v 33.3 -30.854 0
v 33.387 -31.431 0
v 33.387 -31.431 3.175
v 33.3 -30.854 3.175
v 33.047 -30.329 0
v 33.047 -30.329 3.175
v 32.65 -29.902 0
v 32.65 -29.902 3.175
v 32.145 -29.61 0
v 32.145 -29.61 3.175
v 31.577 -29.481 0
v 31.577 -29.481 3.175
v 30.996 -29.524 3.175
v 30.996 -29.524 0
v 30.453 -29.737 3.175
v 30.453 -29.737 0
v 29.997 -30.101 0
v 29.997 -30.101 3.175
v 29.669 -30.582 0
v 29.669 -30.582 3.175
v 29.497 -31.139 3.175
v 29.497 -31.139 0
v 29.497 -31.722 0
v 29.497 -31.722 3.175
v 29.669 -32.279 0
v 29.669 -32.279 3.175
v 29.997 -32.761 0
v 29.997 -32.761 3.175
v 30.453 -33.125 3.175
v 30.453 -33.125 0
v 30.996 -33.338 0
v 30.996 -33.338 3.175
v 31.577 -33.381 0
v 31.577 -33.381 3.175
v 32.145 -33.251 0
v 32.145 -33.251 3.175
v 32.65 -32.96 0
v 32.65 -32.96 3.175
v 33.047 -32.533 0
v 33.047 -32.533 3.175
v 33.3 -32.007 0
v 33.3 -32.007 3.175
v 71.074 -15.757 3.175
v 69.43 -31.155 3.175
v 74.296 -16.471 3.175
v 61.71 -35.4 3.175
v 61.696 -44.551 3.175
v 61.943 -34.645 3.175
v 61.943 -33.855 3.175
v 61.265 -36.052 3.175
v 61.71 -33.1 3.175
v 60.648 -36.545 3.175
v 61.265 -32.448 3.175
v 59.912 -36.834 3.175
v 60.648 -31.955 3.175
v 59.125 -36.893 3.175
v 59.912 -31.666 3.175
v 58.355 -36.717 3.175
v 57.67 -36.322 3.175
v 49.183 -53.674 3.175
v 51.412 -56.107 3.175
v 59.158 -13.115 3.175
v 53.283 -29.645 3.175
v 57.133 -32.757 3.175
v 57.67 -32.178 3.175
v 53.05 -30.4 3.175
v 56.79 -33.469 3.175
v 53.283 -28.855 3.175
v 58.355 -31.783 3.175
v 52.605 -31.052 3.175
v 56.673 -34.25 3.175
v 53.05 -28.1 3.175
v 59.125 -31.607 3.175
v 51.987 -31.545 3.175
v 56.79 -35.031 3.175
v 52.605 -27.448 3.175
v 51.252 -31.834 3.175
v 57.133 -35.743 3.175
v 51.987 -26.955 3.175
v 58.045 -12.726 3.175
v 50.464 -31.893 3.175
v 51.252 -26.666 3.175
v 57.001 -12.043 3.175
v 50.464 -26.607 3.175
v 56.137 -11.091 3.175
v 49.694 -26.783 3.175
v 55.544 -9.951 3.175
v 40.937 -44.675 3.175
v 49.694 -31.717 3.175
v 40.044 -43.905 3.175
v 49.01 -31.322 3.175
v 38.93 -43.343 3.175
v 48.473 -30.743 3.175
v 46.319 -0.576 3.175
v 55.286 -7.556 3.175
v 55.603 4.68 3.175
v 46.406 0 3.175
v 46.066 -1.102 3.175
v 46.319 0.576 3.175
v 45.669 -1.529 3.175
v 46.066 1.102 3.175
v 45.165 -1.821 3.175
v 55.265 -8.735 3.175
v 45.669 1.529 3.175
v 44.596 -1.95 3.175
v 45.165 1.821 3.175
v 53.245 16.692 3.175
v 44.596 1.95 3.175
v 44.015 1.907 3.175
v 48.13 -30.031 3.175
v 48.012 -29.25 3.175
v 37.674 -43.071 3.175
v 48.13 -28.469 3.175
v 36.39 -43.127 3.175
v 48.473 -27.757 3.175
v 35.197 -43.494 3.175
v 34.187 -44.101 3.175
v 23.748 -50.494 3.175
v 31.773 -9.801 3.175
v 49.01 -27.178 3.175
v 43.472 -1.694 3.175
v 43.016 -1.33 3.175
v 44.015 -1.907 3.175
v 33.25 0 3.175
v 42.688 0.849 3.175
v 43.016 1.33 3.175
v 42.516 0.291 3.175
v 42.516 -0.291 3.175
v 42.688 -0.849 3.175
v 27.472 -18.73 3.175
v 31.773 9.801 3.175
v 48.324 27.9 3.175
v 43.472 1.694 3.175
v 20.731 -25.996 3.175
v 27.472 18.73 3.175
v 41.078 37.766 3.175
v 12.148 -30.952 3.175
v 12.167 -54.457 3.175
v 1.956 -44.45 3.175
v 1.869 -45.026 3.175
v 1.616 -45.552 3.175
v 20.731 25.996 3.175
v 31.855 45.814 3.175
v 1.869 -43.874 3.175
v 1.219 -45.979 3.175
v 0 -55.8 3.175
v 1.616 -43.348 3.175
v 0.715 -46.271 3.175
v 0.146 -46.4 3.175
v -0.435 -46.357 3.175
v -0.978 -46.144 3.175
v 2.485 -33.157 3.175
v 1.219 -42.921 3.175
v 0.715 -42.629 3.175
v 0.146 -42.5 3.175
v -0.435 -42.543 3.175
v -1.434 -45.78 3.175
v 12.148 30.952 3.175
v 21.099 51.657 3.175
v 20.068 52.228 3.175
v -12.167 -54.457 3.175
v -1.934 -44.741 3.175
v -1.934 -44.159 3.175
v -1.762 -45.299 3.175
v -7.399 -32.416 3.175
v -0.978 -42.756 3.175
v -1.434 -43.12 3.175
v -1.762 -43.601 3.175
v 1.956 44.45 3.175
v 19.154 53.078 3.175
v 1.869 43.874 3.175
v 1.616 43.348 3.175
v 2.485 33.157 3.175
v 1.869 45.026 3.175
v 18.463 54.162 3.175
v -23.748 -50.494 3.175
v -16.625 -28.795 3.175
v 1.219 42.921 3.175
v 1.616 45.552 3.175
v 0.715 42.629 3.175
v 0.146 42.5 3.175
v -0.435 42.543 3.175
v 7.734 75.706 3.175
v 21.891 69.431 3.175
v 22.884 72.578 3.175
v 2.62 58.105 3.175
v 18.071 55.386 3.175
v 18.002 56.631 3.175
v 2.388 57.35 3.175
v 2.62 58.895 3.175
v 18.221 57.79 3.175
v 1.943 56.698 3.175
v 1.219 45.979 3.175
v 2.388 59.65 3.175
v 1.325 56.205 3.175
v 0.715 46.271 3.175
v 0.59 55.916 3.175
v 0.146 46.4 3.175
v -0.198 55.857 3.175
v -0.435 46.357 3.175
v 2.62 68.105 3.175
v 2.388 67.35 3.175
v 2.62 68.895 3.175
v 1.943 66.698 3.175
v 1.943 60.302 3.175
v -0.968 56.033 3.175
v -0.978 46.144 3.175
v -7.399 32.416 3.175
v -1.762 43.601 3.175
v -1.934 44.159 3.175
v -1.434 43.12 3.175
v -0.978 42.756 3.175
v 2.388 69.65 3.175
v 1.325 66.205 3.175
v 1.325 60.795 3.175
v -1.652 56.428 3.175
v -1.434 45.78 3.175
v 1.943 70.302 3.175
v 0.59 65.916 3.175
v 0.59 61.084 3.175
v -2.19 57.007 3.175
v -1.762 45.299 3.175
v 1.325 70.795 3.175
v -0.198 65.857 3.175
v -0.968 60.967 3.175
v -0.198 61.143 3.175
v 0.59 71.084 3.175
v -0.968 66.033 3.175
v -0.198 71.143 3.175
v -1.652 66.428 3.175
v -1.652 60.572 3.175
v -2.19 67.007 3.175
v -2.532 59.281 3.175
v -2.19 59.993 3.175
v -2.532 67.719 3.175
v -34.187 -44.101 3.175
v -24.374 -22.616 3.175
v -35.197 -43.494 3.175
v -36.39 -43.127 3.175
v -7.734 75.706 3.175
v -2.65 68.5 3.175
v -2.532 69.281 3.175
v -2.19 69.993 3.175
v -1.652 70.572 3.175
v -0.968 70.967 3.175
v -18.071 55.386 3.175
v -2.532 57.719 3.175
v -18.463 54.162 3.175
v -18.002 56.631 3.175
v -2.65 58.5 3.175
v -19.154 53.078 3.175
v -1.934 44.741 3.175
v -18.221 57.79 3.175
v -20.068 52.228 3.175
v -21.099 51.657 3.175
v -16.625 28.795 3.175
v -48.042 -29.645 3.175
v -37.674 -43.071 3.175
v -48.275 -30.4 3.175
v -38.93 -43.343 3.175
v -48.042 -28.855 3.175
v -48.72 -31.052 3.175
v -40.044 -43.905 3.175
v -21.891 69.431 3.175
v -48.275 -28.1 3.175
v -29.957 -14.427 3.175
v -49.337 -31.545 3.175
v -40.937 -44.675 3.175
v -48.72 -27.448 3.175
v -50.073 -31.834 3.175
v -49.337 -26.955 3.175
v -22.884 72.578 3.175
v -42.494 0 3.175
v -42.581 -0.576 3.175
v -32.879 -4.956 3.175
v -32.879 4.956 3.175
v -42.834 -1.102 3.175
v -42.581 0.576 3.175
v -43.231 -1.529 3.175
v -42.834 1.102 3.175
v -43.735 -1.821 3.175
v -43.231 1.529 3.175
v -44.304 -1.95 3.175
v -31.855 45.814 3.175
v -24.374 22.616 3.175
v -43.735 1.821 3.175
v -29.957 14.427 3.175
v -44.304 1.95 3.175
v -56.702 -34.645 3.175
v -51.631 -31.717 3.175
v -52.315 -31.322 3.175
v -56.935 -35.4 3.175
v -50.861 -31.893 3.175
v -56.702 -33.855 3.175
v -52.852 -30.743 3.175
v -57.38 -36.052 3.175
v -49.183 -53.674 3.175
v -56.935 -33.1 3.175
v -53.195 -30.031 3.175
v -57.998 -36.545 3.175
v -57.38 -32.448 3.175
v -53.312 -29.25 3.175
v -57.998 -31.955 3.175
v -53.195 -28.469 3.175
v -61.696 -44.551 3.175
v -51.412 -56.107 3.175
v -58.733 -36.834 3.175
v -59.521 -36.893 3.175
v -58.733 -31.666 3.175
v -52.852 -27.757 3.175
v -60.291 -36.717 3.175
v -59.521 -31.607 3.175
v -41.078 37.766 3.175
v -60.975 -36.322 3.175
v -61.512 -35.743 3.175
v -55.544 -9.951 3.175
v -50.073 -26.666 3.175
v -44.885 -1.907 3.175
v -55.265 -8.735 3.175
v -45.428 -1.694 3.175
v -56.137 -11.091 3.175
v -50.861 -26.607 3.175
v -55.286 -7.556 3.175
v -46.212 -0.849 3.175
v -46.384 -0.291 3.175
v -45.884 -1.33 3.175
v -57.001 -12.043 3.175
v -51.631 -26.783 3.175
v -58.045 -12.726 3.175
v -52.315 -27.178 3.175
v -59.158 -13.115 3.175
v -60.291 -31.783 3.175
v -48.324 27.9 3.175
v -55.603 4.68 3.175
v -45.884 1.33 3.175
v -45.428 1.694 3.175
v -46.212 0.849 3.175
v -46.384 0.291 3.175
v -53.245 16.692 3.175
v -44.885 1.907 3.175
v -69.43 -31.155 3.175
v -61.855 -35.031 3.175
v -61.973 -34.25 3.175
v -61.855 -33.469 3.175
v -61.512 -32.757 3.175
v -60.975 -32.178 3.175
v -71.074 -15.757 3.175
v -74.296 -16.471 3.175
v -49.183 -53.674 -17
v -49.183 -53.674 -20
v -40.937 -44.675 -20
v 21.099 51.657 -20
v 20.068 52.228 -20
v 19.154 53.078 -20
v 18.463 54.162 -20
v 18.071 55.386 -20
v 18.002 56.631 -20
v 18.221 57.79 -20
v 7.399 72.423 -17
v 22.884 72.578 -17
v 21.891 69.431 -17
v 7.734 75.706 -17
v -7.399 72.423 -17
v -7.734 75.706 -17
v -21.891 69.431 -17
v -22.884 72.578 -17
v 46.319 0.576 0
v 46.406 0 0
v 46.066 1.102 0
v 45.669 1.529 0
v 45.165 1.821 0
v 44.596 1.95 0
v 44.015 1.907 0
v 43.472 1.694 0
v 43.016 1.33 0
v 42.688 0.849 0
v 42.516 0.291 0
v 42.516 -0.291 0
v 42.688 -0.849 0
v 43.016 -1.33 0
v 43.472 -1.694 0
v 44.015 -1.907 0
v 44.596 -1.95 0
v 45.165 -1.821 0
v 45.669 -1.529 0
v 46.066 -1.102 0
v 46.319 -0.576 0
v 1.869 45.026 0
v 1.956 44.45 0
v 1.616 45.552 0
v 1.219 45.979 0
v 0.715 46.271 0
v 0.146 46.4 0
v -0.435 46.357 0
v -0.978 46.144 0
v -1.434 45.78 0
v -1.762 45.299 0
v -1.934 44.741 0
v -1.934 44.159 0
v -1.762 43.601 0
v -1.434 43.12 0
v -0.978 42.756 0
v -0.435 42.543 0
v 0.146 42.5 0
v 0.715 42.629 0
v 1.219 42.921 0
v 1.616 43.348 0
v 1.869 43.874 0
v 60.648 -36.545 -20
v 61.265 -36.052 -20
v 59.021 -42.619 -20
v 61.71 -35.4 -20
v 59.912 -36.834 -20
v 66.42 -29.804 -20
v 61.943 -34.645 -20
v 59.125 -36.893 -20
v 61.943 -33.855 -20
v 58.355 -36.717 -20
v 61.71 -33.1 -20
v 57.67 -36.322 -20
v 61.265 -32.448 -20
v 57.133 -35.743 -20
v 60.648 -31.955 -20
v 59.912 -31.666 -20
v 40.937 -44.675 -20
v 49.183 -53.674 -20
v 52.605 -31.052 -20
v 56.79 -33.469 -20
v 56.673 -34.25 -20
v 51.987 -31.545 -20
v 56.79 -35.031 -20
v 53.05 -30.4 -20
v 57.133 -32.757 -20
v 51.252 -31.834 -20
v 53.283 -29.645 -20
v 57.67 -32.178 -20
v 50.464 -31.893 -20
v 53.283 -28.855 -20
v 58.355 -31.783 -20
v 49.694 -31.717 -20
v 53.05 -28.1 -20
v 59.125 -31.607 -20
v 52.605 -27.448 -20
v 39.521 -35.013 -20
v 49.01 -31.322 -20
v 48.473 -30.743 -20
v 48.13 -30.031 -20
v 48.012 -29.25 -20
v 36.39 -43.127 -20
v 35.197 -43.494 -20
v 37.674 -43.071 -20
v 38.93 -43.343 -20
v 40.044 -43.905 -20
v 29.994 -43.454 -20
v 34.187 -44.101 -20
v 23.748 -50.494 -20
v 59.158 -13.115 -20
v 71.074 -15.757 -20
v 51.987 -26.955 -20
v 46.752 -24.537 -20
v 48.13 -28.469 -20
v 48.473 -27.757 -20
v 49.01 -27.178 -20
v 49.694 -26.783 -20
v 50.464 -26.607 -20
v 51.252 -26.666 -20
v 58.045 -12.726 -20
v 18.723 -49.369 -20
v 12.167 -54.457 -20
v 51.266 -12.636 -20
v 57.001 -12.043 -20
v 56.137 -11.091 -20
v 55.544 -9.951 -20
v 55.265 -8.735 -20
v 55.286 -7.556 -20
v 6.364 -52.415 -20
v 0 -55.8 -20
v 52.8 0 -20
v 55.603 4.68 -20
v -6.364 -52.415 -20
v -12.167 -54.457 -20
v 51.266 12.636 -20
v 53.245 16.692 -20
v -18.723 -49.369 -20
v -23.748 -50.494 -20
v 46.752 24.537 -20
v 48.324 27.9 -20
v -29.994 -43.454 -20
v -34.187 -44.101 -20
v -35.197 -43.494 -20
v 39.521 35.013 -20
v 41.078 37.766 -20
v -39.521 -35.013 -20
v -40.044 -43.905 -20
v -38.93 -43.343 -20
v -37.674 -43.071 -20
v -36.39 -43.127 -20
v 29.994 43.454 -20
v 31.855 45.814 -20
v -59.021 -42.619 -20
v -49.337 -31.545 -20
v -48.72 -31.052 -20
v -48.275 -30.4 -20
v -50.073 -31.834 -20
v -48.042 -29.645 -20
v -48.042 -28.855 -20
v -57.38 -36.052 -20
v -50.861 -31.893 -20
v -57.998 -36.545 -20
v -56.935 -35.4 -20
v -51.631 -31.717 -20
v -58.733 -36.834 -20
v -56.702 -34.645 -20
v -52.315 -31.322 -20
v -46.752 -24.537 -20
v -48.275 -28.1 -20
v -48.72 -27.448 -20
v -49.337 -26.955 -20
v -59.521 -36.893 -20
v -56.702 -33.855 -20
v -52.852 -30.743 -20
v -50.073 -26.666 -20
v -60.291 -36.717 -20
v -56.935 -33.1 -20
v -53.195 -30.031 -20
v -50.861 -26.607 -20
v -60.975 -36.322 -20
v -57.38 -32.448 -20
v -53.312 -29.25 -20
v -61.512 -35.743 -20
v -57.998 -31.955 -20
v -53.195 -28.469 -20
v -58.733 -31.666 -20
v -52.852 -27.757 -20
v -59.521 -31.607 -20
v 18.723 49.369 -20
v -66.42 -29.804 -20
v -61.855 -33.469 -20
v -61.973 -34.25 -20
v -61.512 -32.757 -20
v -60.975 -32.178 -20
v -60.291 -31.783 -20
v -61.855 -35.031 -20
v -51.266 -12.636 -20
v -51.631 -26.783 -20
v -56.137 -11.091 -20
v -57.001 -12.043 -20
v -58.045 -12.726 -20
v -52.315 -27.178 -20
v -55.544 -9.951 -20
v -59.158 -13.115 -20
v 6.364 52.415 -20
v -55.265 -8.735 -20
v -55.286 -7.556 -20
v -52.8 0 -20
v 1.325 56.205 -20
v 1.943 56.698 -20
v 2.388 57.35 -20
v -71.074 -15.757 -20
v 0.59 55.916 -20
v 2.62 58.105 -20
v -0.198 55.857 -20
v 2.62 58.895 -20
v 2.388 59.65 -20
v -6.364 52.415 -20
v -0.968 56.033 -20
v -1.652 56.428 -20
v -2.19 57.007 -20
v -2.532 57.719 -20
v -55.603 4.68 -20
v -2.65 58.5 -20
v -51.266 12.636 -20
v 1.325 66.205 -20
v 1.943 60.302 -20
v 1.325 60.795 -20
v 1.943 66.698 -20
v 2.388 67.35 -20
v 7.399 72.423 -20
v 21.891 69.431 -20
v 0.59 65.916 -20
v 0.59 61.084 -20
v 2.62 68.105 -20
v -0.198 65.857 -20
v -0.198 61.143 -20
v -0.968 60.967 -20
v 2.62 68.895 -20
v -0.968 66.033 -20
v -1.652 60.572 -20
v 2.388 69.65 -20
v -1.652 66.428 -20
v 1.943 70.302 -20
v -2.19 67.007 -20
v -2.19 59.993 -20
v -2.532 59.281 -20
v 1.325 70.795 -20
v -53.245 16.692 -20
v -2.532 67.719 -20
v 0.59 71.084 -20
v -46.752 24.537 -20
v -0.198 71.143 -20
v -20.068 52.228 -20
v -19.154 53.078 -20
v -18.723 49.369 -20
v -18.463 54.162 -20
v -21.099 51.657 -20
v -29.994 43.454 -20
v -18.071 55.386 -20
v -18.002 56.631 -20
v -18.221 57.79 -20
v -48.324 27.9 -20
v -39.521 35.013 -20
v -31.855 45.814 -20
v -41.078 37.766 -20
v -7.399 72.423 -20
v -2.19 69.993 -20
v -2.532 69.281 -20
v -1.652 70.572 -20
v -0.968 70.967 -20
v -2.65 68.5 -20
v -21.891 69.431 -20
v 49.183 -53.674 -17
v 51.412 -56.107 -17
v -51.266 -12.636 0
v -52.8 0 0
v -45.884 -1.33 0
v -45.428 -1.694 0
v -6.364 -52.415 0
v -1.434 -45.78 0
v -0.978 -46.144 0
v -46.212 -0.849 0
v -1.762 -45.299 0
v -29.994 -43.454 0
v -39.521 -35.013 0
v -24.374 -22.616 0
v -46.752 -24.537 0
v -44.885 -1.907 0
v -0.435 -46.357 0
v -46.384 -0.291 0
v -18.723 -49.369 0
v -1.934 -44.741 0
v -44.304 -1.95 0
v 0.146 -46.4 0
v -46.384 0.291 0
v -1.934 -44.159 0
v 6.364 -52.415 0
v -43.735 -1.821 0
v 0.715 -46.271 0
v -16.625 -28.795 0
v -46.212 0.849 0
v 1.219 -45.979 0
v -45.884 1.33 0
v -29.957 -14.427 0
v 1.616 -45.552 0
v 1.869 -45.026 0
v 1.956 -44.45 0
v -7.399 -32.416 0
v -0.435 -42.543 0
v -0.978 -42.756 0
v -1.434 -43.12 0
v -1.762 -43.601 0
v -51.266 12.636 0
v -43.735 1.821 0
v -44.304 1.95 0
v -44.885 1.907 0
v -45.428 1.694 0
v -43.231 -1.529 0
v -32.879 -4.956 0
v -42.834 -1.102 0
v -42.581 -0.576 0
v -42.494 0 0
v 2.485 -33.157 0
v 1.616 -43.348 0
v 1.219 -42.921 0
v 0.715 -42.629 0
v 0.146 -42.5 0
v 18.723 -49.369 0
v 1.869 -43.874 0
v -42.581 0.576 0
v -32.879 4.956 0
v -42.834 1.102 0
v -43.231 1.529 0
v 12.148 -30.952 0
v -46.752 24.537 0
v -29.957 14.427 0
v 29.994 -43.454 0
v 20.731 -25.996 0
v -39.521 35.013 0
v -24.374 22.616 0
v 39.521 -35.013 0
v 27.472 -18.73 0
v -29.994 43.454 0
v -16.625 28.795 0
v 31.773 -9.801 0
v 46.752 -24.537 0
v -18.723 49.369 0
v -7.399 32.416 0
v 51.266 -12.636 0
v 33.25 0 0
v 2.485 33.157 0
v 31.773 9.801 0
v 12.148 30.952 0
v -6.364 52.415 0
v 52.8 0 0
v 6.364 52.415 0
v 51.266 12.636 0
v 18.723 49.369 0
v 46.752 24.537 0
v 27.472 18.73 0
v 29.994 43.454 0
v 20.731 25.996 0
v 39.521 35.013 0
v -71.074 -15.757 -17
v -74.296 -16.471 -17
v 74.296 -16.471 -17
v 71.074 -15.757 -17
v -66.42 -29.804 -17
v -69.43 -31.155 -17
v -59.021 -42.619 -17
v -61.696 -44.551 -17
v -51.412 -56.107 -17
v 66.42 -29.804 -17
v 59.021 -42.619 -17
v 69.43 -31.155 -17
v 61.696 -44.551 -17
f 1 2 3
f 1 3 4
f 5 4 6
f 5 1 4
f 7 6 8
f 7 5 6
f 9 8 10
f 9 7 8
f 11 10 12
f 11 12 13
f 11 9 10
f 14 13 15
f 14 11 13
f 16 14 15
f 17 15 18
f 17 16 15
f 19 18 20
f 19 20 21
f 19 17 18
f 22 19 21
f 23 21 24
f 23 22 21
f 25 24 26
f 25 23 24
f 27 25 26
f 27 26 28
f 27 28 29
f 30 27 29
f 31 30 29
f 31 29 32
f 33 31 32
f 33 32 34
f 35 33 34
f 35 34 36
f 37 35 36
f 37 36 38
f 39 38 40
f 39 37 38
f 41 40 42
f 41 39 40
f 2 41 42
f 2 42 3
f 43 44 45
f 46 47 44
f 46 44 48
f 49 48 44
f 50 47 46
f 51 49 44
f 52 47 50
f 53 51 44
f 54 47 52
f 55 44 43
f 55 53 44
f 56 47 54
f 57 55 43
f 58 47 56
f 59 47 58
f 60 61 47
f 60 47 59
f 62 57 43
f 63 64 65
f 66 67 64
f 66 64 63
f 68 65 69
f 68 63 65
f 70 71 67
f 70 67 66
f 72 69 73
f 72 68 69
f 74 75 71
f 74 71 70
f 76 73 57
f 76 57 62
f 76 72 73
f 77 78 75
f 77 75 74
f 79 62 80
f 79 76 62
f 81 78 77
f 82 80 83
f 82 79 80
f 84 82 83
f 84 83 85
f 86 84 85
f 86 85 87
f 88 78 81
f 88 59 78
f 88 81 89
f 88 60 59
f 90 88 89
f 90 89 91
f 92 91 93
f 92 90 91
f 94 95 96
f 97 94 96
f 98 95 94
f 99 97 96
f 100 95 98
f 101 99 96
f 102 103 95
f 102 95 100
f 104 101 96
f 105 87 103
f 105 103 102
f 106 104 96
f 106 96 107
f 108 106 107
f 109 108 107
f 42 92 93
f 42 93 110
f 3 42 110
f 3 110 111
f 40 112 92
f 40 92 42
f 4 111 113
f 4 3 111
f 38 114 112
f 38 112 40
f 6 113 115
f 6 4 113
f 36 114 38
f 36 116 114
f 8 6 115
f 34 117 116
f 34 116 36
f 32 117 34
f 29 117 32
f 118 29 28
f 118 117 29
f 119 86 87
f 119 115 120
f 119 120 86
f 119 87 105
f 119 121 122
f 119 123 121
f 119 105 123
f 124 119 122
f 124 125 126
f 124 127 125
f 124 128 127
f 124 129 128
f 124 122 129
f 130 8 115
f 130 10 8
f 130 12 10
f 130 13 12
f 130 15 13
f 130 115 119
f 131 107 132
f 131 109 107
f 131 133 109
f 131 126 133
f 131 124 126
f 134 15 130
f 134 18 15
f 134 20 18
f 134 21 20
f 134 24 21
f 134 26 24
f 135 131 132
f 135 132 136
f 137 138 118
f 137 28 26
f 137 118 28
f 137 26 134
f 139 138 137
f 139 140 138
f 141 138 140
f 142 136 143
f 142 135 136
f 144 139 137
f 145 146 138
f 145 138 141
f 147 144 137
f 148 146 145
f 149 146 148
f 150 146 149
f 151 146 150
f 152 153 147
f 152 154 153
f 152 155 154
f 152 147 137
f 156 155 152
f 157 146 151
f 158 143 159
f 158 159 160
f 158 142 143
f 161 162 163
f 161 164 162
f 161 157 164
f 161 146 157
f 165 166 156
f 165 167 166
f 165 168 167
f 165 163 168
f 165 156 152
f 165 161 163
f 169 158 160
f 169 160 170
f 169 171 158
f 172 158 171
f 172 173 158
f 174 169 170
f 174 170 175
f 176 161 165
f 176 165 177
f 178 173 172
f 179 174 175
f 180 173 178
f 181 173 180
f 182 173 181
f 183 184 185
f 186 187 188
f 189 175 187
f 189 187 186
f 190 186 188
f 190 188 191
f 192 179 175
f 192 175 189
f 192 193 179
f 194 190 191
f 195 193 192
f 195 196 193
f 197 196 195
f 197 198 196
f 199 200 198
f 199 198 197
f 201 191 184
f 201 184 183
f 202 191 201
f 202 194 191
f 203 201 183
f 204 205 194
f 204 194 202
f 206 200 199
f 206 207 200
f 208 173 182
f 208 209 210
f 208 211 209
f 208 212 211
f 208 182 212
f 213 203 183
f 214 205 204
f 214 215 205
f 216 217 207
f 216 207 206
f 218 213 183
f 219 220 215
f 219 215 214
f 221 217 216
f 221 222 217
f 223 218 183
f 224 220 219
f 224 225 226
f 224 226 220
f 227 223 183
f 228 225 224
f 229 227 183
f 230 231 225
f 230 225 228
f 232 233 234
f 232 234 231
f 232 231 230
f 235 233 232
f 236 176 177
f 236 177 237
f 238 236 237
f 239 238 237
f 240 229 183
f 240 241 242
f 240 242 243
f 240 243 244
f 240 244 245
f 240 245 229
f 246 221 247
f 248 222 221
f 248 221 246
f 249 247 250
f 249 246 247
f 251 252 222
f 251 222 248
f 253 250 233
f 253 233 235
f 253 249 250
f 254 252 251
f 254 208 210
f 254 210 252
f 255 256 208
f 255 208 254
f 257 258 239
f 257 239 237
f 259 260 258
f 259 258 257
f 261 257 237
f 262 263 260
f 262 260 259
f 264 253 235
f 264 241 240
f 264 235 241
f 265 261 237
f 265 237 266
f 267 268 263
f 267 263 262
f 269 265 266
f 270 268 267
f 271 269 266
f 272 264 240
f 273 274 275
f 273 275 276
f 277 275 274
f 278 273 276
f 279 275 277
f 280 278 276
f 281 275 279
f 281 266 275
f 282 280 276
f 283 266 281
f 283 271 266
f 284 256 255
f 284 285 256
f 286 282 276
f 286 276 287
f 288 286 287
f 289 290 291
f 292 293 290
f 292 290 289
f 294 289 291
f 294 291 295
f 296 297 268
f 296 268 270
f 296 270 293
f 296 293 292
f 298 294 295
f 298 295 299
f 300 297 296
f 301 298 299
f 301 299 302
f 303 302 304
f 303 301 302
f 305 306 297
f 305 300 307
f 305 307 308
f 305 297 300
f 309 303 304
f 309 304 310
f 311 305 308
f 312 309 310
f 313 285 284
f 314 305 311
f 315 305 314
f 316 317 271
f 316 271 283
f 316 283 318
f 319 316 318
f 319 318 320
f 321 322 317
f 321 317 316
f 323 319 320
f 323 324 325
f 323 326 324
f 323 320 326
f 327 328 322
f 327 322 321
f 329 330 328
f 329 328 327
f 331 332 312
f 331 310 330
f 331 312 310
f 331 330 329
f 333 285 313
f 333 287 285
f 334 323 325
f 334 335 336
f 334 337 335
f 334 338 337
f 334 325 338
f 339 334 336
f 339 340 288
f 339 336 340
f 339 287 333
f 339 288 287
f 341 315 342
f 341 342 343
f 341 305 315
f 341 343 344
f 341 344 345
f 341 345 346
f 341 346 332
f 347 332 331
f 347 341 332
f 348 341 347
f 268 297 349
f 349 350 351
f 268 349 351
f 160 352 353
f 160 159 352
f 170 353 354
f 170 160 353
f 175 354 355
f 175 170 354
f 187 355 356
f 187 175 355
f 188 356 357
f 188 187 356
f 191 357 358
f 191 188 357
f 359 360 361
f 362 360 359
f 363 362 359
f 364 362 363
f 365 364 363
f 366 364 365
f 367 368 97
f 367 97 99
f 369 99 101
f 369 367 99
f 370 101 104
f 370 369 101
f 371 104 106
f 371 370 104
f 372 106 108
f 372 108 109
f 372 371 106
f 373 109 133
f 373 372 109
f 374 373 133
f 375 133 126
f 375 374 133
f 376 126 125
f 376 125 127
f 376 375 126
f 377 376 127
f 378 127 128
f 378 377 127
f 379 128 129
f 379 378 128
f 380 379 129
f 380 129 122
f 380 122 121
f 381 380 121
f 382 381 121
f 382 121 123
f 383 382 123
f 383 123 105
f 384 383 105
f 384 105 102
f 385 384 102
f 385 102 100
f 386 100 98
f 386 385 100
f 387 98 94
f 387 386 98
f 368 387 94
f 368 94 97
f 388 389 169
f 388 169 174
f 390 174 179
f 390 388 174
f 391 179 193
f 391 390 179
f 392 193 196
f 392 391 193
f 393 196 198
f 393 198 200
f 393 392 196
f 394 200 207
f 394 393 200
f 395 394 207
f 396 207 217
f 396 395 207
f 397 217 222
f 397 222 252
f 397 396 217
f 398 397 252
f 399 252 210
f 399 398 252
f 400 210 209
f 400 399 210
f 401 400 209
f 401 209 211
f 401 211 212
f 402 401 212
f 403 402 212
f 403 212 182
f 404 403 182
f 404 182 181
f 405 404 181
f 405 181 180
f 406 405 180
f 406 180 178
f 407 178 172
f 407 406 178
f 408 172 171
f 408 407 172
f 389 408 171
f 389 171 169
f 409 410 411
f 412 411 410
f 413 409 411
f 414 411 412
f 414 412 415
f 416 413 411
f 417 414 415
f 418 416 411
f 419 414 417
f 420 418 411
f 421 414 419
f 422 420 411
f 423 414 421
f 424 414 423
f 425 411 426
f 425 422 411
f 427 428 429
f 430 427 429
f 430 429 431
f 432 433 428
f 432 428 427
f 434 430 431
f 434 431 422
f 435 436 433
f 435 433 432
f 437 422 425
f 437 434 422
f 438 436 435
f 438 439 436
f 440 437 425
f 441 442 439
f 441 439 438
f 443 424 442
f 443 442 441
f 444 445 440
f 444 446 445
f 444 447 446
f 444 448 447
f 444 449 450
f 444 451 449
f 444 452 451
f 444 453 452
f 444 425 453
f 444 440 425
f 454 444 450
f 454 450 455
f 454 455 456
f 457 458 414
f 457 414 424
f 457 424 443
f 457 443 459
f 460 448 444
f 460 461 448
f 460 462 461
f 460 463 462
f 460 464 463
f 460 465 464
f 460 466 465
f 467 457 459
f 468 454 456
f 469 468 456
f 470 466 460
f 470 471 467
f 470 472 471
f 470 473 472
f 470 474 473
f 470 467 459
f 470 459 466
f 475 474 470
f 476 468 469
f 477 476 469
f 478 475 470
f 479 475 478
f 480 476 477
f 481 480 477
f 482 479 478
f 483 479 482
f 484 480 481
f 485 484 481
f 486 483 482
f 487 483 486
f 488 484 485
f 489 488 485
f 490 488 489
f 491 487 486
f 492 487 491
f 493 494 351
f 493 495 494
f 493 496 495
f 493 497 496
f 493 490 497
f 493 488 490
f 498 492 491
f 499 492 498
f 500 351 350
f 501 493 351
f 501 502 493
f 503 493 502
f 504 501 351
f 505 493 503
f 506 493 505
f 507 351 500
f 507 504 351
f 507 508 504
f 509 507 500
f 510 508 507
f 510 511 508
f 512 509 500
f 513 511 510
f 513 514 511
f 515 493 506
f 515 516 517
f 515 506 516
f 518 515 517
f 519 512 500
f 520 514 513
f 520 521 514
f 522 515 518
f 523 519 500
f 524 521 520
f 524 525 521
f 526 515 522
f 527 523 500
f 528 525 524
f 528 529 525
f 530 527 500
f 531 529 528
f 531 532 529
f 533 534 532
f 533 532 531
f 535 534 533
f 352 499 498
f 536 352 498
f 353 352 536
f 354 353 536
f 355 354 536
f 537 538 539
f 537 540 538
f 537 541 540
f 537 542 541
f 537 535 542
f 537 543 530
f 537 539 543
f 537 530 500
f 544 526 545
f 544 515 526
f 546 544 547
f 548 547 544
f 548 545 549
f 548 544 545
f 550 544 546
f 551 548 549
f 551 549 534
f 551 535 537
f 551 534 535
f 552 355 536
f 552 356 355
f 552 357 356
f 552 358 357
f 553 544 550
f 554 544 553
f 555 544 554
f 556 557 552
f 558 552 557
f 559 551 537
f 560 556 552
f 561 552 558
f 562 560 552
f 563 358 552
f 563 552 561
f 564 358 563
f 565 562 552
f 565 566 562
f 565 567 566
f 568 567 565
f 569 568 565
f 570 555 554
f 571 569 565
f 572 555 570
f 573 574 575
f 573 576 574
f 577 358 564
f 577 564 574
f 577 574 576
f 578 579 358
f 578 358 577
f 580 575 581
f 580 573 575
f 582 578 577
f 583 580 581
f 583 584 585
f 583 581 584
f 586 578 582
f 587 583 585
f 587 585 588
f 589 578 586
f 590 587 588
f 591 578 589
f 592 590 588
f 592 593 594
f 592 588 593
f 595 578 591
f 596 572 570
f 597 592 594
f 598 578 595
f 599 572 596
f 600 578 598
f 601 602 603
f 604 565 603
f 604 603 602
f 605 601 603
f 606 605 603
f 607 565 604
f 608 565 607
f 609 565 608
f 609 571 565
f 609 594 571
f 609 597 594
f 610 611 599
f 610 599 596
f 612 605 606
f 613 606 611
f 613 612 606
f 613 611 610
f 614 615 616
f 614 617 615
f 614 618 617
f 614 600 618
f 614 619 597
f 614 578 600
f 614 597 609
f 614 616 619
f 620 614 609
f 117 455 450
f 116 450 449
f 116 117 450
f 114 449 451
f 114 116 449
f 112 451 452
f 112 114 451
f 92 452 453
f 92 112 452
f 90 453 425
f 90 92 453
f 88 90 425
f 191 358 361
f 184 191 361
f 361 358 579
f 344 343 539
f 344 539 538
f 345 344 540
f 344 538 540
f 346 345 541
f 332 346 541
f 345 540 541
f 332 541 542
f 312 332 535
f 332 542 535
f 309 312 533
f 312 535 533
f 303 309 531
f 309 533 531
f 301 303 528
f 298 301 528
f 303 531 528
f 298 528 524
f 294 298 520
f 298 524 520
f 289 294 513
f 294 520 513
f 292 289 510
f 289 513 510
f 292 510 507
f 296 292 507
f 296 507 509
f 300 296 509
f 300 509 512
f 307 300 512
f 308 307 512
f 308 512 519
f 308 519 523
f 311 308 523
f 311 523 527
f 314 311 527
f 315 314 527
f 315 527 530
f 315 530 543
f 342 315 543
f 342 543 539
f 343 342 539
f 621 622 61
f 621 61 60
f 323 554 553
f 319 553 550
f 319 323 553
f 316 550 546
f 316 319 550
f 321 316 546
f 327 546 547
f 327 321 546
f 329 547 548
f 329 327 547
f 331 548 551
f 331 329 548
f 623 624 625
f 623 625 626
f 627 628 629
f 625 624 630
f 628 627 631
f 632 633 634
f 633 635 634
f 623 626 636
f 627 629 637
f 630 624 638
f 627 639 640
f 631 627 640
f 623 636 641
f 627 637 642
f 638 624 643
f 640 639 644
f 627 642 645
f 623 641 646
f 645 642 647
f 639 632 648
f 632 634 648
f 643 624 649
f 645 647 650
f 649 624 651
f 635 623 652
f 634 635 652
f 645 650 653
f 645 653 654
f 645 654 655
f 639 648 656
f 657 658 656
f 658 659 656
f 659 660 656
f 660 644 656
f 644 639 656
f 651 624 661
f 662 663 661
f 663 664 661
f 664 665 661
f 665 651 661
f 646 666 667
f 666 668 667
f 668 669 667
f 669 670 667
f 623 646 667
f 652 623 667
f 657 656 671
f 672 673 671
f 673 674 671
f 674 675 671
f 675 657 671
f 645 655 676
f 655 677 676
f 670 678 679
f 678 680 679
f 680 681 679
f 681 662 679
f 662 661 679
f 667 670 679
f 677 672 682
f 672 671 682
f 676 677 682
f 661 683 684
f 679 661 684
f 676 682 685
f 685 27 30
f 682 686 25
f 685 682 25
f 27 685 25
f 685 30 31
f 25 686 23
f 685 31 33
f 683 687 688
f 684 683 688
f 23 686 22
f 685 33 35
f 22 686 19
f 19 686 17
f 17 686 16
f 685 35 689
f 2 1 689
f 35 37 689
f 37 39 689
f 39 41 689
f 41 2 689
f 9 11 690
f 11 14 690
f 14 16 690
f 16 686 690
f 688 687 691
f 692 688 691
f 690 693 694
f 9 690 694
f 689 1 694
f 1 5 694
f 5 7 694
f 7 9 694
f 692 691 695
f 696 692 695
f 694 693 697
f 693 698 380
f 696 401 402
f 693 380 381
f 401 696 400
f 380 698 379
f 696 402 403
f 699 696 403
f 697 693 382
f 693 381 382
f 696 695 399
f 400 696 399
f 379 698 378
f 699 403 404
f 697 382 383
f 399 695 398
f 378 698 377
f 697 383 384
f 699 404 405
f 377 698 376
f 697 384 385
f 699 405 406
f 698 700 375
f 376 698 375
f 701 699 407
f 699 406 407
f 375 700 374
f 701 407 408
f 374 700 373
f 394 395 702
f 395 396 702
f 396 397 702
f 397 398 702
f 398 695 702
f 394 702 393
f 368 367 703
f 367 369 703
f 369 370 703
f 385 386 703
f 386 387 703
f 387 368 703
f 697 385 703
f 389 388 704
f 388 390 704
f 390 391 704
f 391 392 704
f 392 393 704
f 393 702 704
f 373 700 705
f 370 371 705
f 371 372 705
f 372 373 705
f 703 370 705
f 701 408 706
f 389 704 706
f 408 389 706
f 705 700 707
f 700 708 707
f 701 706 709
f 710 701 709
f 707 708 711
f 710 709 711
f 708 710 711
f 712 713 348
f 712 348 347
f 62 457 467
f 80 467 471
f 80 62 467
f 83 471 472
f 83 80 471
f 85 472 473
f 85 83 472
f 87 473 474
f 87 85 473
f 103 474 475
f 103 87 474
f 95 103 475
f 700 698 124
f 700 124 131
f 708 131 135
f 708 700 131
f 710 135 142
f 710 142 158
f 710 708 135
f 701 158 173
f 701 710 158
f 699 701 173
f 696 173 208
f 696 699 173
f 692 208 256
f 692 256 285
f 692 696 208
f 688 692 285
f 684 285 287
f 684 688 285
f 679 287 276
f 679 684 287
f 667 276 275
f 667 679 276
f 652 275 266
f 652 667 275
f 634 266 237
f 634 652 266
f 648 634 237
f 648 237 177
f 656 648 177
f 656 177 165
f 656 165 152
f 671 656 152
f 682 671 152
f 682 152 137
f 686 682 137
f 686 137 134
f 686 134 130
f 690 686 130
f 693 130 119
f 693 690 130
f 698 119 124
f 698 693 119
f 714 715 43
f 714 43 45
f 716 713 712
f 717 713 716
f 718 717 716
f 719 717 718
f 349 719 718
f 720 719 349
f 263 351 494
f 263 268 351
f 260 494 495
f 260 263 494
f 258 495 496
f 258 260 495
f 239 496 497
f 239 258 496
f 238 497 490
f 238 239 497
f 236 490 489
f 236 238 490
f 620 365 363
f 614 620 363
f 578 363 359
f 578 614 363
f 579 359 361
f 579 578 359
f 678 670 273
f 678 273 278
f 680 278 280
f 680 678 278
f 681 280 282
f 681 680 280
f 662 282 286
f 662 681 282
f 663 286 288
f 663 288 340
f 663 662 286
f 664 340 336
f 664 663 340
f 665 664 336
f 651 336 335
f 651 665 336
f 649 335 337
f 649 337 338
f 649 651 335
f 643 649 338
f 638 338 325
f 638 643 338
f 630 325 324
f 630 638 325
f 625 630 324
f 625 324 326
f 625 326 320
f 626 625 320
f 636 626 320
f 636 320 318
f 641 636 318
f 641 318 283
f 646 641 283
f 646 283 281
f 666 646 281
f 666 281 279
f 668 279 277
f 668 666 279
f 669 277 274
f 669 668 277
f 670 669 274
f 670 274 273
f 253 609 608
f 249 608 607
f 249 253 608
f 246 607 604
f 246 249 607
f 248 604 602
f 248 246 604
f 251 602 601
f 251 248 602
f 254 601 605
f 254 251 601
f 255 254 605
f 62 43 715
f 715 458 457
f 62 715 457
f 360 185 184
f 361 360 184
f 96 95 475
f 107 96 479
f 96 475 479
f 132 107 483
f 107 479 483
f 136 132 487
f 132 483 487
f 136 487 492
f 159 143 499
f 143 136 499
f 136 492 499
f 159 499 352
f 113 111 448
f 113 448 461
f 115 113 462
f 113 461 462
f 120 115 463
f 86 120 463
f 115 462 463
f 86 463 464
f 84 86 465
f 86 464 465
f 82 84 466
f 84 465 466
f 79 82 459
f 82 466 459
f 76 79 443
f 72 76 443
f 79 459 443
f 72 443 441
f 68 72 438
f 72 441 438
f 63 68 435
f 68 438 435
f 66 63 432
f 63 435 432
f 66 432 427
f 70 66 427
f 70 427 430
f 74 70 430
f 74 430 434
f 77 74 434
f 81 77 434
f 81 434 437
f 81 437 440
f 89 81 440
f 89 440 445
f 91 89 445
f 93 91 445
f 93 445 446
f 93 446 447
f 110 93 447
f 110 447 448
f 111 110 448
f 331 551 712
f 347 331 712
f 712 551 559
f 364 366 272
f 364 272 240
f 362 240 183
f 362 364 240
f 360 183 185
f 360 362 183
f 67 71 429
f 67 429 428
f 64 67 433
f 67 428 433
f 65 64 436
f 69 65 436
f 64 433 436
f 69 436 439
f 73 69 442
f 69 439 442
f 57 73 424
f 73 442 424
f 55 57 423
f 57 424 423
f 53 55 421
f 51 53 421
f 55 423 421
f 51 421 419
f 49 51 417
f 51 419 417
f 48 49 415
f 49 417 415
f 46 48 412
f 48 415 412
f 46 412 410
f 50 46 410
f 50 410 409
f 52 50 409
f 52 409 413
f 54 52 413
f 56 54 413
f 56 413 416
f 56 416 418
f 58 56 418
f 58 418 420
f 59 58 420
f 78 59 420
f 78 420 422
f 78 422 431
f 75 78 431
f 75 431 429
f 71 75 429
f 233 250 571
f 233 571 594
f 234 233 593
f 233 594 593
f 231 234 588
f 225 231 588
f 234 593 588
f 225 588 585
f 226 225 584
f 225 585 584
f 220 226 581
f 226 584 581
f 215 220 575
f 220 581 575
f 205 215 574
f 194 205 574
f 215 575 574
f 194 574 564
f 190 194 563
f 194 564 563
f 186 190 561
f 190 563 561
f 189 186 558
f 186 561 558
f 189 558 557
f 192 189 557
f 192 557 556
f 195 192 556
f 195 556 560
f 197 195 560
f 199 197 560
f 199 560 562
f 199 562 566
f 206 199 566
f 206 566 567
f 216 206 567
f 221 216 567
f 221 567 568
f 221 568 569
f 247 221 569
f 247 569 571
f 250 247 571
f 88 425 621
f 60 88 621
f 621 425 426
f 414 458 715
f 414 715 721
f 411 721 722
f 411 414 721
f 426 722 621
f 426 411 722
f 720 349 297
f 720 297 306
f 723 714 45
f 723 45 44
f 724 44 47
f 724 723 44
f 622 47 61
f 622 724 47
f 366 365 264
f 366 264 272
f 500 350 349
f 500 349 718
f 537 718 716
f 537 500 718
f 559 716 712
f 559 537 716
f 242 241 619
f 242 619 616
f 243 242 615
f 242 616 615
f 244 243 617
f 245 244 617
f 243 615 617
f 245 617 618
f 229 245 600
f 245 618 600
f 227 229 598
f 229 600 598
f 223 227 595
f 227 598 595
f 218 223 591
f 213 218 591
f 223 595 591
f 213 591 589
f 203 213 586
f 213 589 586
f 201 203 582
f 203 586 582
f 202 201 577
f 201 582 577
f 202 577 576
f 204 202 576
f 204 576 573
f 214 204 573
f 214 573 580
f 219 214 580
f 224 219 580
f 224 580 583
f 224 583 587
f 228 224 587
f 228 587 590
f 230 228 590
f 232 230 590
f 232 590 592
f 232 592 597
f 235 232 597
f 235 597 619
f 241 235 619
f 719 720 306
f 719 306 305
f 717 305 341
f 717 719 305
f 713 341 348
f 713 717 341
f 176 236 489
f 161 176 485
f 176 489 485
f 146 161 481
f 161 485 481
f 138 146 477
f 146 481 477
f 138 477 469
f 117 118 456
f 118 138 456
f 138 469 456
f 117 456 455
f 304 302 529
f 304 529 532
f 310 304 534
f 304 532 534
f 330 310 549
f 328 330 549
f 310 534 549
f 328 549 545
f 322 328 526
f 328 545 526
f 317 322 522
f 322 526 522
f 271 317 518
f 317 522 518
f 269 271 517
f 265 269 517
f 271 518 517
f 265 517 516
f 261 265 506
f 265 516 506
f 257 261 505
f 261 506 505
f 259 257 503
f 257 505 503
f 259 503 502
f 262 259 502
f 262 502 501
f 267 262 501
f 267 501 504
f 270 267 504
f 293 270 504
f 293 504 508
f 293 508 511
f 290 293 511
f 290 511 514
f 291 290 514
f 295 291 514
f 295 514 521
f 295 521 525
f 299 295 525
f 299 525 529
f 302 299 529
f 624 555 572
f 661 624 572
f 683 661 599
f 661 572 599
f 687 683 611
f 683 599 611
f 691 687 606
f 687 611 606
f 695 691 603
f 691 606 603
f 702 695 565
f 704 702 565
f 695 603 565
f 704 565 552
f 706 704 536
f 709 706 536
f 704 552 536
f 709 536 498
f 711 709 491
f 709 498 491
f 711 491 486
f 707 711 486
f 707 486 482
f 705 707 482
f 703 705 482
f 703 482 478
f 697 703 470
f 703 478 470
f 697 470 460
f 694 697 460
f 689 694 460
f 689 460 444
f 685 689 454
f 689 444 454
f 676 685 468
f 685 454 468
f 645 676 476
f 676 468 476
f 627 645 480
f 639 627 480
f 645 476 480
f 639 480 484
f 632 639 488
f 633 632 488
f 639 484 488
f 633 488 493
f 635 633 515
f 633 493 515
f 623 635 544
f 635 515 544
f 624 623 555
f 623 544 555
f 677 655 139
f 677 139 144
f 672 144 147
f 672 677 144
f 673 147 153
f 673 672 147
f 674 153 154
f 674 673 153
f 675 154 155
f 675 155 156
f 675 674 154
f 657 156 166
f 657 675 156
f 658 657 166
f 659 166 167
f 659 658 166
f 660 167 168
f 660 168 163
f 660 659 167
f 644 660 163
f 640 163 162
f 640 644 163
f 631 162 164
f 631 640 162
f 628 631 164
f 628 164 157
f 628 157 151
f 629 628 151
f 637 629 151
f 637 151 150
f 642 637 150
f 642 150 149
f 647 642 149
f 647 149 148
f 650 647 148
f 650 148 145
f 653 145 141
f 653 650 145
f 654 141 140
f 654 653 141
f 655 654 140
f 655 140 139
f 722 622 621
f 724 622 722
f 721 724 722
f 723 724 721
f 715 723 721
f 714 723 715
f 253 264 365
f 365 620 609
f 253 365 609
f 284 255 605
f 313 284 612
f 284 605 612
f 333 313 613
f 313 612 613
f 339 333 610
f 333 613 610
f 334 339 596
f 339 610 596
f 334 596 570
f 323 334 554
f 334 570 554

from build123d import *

# Parameters (mm, degrees)
SKETCH1_R                = 72.8
SKETCH1_R_2              = 2.065
SKETCH1_R_3              = 1.9558
SKETCH1_R_4              = 33.25
BOSS_EXTRUDE1_DEPTH      = 3.175
BOSS_EXTRUDE4_START      = 20
SKETCH14_R               = 72.8
SKETCH14_R_2             = 52.8
BOSS_EXTRUDE4_DEPTH      = 20
SKETCH15_R               = 2.065
CUT_EXTRUDE6_DEPTH       = 106.530851532
M5_CLEARANCE_HOLE1_D     = 5.3
CUT_EXTRUDE8_DEPTH       = 106.530851532
FILLET1_R                = 5
CIRPATTERN4_COUNT        = 3
FILLET1_OF_CIRPATTERN4_R = 5
BOSS_EXTRUDE8_START      = -20.175
BOSS_EXTRUDE8_DEPTH      = 30.175
CUT_EXTRUDE9_START       = -10
CUT_EXTRUDE9_DEPTH       = 10
CIRPATTERN5_COUNT        = 3


with BuildPart() as part:
    # Sketch1 → Boss-Extrude1 (new body)
    with BuildSketch(Plane.XY):
        Circle(SKETCH1_R)
        with Locations((50.662486121, -29.25)):
            Circle(SKETCH1_R_2, mode=Mode.SUBTRACT)
        with Locations((59.322740159, -34.25)):
            Circle(SKETCH1_R_2, mode=Mode.SUBTRACT)
        with Locations((-59.322740159, -34.25)):
            Circle(SKETCH1_R_2, mode=Mode.SUBTRACT)
        with Locations((-50.662486121, -29.25)):
            Circle(SKETCH1_R_2, mode=Mode.SUBTRACT)
        with Locations((0, 44.45)):
            Circle(SKETCH1_R_3, mode=Mode.SUBTRACT)
        with Locations((-44.45, 0)):
            Circle(SKETCH1_R_3, mode=Mode.SUBTRACT)
        with Locations((0, -44.45)):
            Circle(SKETCH1_R_3, mode=Mode.SUBTRACT)
        with Locations((31.430896424, -31.430896424)):
            Circle(SKETCH1_R_3, mode=Mode.SUBTRACT)
        with Locations((44.45, 0)):
            Circle(SKETCH1_R_3, mode=Mode.SUBTRACT)
        with Locations((0, 68.5)):
            Circle(SKETCH1_R_2, mode=Mode.SUBTRACT)
        with Locations((0, 58.5)):
            Circle(SKETCH1_R_2, mode=Mode.SUBTRACT)
        Circle(SKETCH1_R_4, mode=Mode.SUBTRACT)
    extrude(amount=BOSS_EXTRUDE1_DEPTH)

    # Sketch14 → Boss-Extrude4 (add)
    with BuildSketch(Plane(origin=(0, 0, 0), x_dir=(-1, 0, 0), z_dir=(0, 0, -1)).offset(BOSS_EXTRUDE4_START)):
        Circle(SKETCH14_R)
        Circle(SKETCH14_R_2, mode=Mode.SUBTRACT)
    extrude(amount=-BOSS_EXTRUDE4_DEPTH)

    # Sketch15 → Cut-Extrude6 (cut, through all)
    with BuildSketch(Plane.XY.offset(3.175)):
        with Locations((-59.322740159, -34.25)):
            Circle(SKETCH15_R)
        with Locations((-50.662486121, -29.25)):
            Circle(SKETCH15_R)
        with Locations((59.322740159, -34.25)):
            Circle(SKETCH15_R)
        with Locations((50.662486121, -29.25)):
            Circle(SKETCH15_R)
        with Locations((0, 58.5)):
            Circle(SKETCH15_R)
        with Locations((0, 68.5)):
            Circle(SKETCH15_R)
    extrude(amount=-CUT_EXTRUDE6_DEPTH, mode=Mode.SUBTRACT)

    # M5 Clearance Hole1 (through all)
    with Locations(Plane.XY.offset(3.175)):
        with Locations((0, 58.5), (0, 68.5), (50.662486121, -29.25), (59.322740159, -34.25), (-59.322740159, -34.25), (-50.662486121, -29.25)):
            Hole(M5_CLEARANCE_HOLE1_D / 2)

    # Sketch30 → Cut-Extrude8 (cut, through all)
    with BuildSketch(Plane(origin=(0, 0, -20), x_dir=(-1, 0, 0), z_dir=(0, 0, -1))):
        with BuildLine():
            ThreePointArc((-21.891382204, 69.430594014), (-63.046649396, 36.4), (-71.074349318, -15.756803895))
            Line((-71.074349318, -15.756803895), (-56.429909212, -12.510209686))
            Line((-56.429909212, -12.510209686), (-54.477317197, -12.077330458))
            ThreePointArc((-54.477317197, -12.077330458), (-48.324217531, 27.9), (-16.779383612, 53.217405852))
            Line((-16.779383612, 53.217405852), (-17.380795211, 55.124839753))
            Line((-17.380795211, 55.124839753), (-21.891382204, 69.430594014))
        make_face()
    cut_extrude8 = extrude(amount=-CUT_EXTRUDE8_DEPTH, mode=Mode.SUBTRACT)

    # Fillet1
    fillet1_edges = [part.edges().sort_by_distance(p)[0] for p in [
        (54.477317197, -12.077330458, -8.4125),
        (16.779383612, 53.217405852, -8.4125),
    ]]
    fillet(fillet1_edges, radius=FILLET1_R)

    # CirPattern4: Cut-Extrude8 ×3 about axis
    cirpattern4_axis = Axis((0, 0, 0), (0, 0, 1))
    for i in range(1, CIRPATTERN4_COUNT):
        add(cut_extrude8.rotate(cirpattern4_axis, i * 360 / CIRPATTERN4_COUNT), mode=Mode.SUBTRACT)

    # Fillet1 of CirPattern4
    fillet1_of_cirpattern4_edges = [part.edges().sort_by_distance(p)[0] for p in [
        (-16.779383612, 53.217405852, -8.4125),
        (-54.477317197, -12.077330458, -8.4125),
        (-37.697933585, -41.140075394, -8.4125),
        (37.697933585, -41.140075394, -8.4125),
    ]]
    fillet(fillet1_of_cirpattern4_edges, radius=FILLET1_OF_CIRPATTERN4_R)

    # Sketch31 → Boss-Extrude8 (add)
    with BuildSketch(Plane.XY.offset(3.175).offset(BOSS_EXTRUDE8_START)):
        with BuildLine():
            Line((21.891382204, 69.430594014), (21.816905179, 69.19438307))
            ThreePointArc((21.816905179, 69.19438307), (0, 72.552325945), (-21.816905179, 69.19438307))
            Line((-21.816905179, 69.19438307), (-22.883711342, 72.577859952))
            ThreePointArc((-22.883711342, 72.577859952), (0, 76.1), (22.883711342, 72.577859952))
            Line((22.883711342, 72.577859952), (21.891382204, 69.430594014))
        make_face()
    boss_extrude8 = extrude(amount=BOSS_EXTRUDE8_DEPTH)

    # Sketch32 → Cut-Extrude9 (cut)
    with BuildSketch(Plane.XY.offset(13.175).offset(CUT_EXTRUDE9_START)):
        with BuildLine():
            Line((21.816905179, 69.19438307), (22.883711342, 72.577859952))
            ThreePointArc((22.883711342, 72.577859952), (0, 76.1), (-22.883711342, 72.577859952))
            Line((-22.883711342, 72.577859952), (-21.816905179, 69.19438307))
            ThreePointArc((-21.816905179, 69.19438307), (0, 72.552325945), (21.816905179, 69.19438307))
        make_face()
    cut_extrude9 = extrude(amount=CUT_EXTRUDE9_DEPTH, mode=Mode.SUBTRACT)

    # CirPattern5: Boss-Extrude8, Cut-Extrude9 ×3 about axis
    cirpattern5_axis = Axis((0, 0, 0), (0, 0, 1))
    add([boss_extrude8.rotate(cirpattern5_axis, i * 360 / CIRPATTERN5_COUNT) for i in range(1, CIRPATTERN5_COUNT)])
    add([cut_extrude9.rotate(cirpattern5_axis, i * 360 / CIRPATTERN5_COUNT) for i in range(1, CIRPATTERN5_COUNT)], mode=Mode.SUBTRACT)


solid = part.part
